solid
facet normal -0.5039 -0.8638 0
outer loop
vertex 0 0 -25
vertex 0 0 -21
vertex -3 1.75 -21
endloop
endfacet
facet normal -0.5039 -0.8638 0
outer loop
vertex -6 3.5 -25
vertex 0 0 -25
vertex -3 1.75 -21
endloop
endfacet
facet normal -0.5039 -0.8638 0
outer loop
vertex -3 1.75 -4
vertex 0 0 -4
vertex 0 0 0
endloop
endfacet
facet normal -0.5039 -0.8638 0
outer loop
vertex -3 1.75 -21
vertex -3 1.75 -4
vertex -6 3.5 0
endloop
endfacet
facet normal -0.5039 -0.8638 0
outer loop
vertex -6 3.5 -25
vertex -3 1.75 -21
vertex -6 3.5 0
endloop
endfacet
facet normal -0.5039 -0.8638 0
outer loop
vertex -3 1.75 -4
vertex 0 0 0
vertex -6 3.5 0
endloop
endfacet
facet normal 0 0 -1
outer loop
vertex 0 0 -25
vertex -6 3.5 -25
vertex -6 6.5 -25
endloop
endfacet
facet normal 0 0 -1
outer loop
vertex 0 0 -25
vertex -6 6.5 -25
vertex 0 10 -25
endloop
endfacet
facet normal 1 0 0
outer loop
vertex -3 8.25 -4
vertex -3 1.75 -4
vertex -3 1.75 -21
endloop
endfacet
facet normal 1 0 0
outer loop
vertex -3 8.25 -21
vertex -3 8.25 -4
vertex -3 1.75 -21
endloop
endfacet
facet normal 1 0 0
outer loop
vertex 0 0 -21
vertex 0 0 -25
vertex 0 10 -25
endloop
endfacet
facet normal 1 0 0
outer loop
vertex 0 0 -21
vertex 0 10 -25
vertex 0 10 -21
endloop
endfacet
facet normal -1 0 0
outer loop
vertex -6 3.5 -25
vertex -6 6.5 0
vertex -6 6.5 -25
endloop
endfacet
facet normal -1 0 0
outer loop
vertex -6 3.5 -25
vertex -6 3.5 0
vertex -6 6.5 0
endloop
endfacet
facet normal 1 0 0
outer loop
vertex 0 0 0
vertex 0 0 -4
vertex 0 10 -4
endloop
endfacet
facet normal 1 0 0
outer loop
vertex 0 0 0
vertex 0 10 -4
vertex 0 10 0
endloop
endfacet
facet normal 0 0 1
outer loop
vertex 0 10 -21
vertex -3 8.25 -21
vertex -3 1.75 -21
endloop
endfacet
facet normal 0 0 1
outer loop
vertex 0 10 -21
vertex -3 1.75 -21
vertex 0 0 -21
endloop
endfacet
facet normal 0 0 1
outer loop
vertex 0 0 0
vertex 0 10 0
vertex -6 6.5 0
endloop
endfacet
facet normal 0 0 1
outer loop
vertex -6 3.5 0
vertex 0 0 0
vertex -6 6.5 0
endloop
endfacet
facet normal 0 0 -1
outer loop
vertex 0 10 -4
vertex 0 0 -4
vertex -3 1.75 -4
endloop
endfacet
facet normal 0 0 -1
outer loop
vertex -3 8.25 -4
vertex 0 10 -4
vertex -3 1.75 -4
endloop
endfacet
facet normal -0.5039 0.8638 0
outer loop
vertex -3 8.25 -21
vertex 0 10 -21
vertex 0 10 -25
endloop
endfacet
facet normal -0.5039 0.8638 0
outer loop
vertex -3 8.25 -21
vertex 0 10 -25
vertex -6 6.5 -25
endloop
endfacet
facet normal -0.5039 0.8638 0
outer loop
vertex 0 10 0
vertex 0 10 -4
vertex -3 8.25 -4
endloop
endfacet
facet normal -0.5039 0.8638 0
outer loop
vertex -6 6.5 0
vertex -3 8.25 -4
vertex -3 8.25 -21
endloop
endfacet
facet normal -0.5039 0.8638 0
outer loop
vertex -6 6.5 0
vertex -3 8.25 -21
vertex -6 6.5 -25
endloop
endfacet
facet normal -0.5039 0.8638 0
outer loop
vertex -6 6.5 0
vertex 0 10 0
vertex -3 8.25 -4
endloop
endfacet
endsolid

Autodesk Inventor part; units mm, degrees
ref_plane "YZ Plane" through (0, 0, 0) normal (1, 0, 0) x (0, 1, 0)
ref_plane "XZ Plane" through (0, 0, 0) normal (0, 1, 0) x (-1, 0, 0)
ref_plane "XY Plane" through (0, 0, 0) normal (0, 0, 1) x (1, 0, 0)
sketch "Sketch1" plane through (0, 0, 0) normal (0, 1, 0) x (-1, 0, 0)
  line L0 (0, 0) -> (6, 0)
  line L1 (6, 0) -> (6, -25)
  line L2 (6, -25) -> (0, -25)
  line L3 (0, -25) -> (0, 0)
  line L4 (0, -21) -> (0, -4)
  dimension "d0" = 25
  dimension "d1" = 6
sketch "Sketch2" plane through (0, 0, 0) normal (0, 0, 1) x (1, 0, 0)
  line L0 (0, 0) -> (-6, 0)
  line L1 (-6, 0) -> (-6, 10)
  line L2 (-6, 10) -> (0, 10)
  line L3 (0, 10) -> (0, 0)
  line L4 (0, 0) -> (-6, 3.5)
  line L5 (0, 10) -> (-6, 6.5)
  dimension "d5" = 10
  dimension "d6" = 6
  dimension "d13" = 3.5
  dimension "d14" = 3.5
sketch "Sketch3" plane through (0, 0, 0) normal (0, 1, 0) x (-1, 0, 0)
  line L0 (0, -4) -> (3, -4)
  line L1 (3, -4) -> (3, -21)
  line L2 (3, -21) -> (0, -21)
  line L3 (0, -21) -> (0, -4)
  point P0 (0, 0)
  dimension "d7" = 4
  dimension "d8" = 3
  dimension "d9" = 21
  dimension "d10" = 0
extrude "Extrusion1" add sketch "Sketch1" along normal blind 10
extrude "Extrusion2" cut sketch "Sketch3" along normal blind 10
extrude "Extrusion3" cut sketch "Sketch2" against normal blind 25 contours L5 L1 L2
extrude "Extrusion4" cut sketch "Sketch2" against normal blind 25 contours L0 L1 L4
equation "\"d6\" = d1"
equation "\"d13\" = d14"
equation "\"d9\" = d0 - d7"
equation "\"d11\" = d5"
equation "\"d15\" = d5"
equation "\"d17\" = d0"
equation "\"d19\" = d0"
properties part number "cable_tie_bracket"
